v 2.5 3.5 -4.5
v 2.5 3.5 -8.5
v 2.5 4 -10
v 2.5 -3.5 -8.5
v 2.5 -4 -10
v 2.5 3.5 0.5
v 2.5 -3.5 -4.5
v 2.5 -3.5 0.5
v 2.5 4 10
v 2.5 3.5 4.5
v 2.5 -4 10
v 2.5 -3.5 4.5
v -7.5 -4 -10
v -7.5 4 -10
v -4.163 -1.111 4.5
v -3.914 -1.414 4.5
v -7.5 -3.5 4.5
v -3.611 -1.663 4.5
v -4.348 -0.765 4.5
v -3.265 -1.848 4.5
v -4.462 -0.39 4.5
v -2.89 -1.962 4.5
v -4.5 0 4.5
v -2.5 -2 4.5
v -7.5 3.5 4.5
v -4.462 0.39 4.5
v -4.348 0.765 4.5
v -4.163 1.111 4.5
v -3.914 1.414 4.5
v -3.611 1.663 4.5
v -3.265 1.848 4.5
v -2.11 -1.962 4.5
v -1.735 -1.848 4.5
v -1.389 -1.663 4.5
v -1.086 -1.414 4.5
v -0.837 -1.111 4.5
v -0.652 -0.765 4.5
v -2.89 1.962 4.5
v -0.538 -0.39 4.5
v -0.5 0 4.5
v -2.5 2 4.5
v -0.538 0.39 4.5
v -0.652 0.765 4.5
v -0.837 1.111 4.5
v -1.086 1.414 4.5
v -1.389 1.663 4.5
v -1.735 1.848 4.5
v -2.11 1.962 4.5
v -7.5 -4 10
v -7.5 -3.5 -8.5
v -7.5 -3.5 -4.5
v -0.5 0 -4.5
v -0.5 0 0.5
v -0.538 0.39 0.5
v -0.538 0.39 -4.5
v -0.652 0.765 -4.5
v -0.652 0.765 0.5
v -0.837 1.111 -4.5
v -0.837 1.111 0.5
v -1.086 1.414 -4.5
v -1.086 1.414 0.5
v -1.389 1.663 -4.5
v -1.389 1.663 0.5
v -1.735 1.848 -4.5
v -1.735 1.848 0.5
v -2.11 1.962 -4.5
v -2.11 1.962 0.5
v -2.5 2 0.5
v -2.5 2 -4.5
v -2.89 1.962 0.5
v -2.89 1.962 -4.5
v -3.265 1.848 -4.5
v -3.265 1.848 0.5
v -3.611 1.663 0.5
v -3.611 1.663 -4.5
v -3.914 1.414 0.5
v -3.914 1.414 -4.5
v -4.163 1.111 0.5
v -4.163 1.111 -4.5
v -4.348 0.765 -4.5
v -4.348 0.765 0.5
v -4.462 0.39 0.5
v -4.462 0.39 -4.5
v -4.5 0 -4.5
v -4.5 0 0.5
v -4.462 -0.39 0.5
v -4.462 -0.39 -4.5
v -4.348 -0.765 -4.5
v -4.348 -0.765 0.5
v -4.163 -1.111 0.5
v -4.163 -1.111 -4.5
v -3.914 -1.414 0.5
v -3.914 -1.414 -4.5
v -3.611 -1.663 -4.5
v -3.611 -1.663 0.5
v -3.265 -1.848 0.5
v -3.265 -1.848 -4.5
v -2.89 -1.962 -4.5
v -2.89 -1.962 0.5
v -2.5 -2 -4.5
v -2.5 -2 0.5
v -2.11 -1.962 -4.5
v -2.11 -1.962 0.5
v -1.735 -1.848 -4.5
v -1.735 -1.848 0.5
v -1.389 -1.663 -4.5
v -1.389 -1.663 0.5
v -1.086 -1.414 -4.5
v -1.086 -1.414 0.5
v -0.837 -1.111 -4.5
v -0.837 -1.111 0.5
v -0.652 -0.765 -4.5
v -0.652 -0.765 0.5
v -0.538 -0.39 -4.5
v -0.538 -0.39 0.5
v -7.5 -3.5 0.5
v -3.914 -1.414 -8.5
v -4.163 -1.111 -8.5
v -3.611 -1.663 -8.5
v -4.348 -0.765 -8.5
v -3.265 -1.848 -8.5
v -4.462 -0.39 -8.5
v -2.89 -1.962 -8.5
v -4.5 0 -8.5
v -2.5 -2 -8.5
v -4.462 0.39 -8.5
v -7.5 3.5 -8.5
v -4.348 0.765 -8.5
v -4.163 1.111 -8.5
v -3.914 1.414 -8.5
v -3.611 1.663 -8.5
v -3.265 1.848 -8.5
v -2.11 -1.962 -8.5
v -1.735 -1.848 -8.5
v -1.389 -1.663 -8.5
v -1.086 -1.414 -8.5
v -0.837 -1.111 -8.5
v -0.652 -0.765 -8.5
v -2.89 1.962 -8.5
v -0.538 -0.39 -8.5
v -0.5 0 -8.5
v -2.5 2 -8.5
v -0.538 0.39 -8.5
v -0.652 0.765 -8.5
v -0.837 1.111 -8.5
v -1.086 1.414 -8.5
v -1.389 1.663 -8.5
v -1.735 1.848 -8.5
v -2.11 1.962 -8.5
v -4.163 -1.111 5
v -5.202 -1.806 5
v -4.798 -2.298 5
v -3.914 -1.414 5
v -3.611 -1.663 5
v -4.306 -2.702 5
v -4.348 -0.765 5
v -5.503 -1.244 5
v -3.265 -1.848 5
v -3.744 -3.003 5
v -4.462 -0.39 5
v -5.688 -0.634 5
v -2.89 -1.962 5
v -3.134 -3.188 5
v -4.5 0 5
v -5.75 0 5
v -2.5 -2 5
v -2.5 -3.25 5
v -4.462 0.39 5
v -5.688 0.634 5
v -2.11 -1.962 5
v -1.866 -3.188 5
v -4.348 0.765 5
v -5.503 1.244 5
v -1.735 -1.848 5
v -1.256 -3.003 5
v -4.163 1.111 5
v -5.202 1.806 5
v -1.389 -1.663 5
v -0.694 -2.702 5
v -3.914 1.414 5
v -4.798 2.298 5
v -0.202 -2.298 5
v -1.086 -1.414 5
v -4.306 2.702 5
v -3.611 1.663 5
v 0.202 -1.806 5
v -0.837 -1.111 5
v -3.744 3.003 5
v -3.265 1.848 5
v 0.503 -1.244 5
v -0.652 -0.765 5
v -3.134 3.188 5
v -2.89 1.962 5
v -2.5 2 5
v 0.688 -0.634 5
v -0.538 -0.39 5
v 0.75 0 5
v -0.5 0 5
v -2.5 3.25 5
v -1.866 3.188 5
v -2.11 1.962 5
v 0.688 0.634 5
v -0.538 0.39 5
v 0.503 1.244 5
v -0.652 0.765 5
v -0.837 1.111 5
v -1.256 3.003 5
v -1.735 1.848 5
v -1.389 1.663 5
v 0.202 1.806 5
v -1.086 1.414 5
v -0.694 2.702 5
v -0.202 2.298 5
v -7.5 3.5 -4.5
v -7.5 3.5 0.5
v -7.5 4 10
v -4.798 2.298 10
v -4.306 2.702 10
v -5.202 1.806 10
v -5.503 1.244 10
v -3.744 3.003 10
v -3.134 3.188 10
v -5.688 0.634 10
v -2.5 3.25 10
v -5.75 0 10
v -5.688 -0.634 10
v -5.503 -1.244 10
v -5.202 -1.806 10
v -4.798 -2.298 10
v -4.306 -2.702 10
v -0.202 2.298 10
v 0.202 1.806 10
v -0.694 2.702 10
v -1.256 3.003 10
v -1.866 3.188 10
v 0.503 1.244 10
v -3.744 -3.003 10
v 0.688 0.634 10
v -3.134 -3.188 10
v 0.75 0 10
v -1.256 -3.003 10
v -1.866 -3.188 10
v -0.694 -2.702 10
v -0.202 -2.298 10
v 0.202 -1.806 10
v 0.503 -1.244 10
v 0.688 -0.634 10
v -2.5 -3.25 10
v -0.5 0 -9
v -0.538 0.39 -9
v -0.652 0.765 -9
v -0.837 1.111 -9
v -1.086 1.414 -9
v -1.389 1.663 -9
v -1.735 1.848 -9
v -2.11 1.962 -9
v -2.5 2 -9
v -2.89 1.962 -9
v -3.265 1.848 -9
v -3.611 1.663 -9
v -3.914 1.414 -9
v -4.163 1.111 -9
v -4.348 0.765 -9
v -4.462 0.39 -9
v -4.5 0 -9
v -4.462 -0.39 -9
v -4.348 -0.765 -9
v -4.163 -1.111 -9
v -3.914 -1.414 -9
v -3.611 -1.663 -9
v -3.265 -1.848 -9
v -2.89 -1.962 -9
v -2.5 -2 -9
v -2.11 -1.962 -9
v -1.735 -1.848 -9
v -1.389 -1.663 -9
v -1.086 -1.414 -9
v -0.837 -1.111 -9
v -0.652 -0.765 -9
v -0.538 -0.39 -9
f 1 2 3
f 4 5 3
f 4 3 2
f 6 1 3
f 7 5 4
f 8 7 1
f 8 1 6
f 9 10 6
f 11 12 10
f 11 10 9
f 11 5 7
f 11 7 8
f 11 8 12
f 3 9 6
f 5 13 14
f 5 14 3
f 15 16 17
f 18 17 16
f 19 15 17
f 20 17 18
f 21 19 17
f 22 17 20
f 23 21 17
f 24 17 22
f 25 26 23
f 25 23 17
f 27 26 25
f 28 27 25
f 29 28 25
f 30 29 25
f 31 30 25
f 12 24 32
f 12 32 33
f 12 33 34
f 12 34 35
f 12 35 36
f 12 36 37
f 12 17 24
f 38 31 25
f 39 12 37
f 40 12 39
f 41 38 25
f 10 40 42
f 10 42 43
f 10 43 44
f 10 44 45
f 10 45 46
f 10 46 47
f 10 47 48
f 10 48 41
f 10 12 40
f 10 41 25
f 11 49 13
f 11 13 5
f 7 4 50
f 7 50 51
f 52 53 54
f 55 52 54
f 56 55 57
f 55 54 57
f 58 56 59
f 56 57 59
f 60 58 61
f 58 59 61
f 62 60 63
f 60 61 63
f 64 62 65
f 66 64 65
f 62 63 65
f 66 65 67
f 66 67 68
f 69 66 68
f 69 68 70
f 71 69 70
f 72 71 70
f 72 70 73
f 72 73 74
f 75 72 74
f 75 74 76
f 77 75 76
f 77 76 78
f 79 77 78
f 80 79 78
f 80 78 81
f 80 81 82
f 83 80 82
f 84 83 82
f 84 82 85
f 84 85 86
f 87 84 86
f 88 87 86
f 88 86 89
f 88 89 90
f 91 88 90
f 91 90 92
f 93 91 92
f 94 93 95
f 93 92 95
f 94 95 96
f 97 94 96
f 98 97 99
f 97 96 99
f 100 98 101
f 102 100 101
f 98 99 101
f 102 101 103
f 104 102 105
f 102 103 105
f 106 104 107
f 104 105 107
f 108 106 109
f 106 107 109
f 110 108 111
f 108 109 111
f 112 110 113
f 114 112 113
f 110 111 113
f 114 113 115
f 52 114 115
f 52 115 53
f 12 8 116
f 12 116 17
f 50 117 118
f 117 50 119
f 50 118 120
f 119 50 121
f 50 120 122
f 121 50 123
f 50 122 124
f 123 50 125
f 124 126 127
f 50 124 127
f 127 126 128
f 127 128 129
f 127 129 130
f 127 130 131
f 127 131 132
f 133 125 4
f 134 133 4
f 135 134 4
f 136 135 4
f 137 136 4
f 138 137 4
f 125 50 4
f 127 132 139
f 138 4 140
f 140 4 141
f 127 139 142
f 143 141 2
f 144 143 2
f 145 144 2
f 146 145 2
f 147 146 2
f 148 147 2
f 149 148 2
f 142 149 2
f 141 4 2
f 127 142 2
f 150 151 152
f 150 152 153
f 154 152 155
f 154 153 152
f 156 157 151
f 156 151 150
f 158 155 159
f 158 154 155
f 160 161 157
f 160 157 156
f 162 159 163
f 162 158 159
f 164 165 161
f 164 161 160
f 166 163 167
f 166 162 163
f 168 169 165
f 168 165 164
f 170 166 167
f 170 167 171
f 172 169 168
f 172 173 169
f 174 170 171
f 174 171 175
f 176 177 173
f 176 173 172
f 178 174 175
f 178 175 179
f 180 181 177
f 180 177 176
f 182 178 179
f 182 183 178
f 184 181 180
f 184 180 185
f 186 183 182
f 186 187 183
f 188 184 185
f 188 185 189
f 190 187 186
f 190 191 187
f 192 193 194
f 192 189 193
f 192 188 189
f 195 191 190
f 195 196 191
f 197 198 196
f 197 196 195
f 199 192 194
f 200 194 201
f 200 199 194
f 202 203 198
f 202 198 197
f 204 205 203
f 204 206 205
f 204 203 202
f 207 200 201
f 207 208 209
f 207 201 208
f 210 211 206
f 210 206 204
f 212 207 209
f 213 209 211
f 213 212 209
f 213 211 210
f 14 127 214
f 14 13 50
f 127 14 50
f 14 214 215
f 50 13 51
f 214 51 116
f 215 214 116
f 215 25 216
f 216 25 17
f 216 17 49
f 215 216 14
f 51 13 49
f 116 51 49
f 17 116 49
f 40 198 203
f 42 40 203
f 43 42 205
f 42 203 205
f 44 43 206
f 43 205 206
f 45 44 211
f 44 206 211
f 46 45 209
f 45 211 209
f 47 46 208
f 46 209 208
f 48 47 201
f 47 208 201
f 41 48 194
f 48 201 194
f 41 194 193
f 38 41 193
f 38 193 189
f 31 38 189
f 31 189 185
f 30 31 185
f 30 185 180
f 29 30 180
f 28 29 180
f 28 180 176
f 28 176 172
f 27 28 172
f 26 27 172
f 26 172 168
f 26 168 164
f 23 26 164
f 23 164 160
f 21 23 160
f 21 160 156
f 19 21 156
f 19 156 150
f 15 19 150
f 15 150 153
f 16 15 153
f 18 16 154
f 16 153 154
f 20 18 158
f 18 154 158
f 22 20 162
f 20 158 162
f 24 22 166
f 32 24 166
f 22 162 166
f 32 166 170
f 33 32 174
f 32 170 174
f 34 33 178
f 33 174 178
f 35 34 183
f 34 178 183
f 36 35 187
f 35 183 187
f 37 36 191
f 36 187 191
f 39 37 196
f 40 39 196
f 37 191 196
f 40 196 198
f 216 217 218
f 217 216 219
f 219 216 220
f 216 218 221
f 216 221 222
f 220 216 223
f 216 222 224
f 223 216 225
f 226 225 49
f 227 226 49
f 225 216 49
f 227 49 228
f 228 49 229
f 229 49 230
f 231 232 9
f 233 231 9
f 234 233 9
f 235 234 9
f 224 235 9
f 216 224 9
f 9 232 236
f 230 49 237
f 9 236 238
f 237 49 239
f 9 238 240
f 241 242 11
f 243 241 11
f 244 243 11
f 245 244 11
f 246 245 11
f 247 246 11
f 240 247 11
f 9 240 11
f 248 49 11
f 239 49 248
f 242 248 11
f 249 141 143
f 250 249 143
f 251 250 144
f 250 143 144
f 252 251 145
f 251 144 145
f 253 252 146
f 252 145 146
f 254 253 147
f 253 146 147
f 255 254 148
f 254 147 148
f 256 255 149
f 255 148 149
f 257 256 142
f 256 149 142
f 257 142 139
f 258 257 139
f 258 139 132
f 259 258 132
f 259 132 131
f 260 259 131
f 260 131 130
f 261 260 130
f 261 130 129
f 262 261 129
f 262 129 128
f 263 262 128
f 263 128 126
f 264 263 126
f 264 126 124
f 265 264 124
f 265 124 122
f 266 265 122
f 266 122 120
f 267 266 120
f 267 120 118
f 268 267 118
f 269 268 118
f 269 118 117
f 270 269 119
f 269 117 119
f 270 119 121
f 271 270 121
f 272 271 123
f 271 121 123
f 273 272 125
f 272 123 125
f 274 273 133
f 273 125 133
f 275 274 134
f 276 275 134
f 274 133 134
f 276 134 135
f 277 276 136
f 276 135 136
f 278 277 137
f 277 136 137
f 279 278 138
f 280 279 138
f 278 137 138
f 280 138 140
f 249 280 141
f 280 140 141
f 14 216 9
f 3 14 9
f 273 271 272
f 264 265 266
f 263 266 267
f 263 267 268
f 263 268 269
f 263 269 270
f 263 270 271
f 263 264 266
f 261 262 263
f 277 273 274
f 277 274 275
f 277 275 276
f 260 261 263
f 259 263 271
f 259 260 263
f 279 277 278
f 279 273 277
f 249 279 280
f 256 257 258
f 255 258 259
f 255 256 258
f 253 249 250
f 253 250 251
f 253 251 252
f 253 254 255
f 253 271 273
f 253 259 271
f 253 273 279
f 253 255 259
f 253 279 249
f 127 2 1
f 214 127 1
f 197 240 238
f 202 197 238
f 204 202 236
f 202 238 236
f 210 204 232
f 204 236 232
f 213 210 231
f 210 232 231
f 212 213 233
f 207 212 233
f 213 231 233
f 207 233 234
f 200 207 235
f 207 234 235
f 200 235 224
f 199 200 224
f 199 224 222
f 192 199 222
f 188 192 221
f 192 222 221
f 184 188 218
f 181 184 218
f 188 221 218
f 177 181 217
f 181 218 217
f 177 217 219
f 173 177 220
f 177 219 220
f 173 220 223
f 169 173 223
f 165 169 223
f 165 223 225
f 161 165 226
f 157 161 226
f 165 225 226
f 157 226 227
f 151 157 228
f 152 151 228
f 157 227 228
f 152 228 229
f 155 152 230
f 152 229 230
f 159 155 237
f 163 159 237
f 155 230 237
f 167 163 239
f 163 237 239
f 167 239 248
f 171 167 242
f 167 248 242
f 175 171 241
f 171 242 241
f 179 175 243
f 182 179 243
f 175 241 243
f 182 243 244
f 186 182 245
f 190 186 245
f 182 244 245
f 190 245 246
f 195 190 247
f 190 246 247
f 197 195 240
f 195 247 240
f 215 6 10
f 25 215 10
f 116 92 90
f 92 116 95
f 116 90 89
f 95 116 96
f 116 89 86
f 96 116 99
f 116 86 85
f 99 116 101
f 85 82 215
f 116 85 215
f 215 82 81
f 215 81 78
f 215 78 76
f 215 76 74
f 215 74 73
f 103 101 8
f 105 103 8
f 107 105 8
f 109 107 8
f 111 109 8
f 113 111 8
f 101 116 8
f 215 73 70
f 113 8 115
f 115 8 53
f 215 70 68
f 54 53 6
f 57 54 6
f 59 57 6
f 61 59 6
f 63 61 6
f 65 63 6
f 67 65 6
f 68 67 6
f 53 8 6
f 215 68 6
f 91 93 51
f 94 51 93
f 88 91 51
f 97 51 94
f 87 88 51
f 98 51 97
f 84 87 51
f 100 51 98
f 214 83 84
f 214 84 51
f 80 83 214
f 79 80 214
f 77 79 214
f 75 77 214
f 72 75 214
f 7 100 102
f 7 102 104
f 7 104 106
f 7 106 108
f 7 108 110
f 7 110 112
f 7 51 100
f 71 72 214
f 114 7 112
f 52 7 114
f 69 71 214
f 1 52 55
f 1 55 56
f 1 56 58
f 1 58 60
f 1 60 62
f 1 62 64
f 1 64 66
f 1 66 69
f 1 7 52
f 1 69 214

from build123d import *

# Parameters (mm, degrees)
F0_W     = 15
F0_H     = 20
F1_DEPTH = 4
F2_R     = 2
F3_DEPTH = 19
F4_R     = 3.25
F4_R_2   = 2
F5_DEPTH = 5
F6_W     = 7
F6_H     = 4
F7_DEPTH = 15.001
F8_W     = 5
F8_H     = 20
F9_DEPTH = 8.001


with BuildPart() as f1:
    # F0 (on Front) → F1 (new body, symmetric)
    with BuildSketch(Plane.XZ):
        Rectangle(F0_W, F0_H)
    extrude(amount=F1_DEPTH, both=True)

    # F2 (on face) → F3 (cut)
    with BuildSketch(Plane.XY.offset(10)):
        with Locations((-2.5, 0)):
            Circle(F2_R)
    extrude(amount=-F3_DEPTH, mode=Mode.SUBTRACT)

    # F4 (on face) → F5 (cut)
    with BuildSketch(Plane.XY.offset(10)):
        with Locations((-2.5, 0)):
            Circle(F4_R)
        with Locations((-2.5, 0)):
            Circle(F4_R_2, mode=Mode.SUBTRACT)
    extrude(amount=-F5_DEPTH, mode=Mode.SUBTRACT)

    # F6 (on face) → F7 (cut, through all)
    with BuildSketch(Plane.YZ.offset(7.5)):
        with Locations((0, 2.5)):
            Rectangle(F6_W, F6_H)
        with Locations((0, -6.5)):
            Rectangle(F6_W, F6_H)
    extrude(amount=-F7_DEPTH, mode=Mode.SUBTRACT)

    # F8 (on face) → F9 (cut, through all)
    with BuildSketch(Plane.XZ.offset(4)):
        with Locations((5, 0)):
            Rectangle(F8_W, F8_H)
    extrude(amount=-F9_DEPTH, mode=Mode.SUBTRACT)


solid = f1.part
